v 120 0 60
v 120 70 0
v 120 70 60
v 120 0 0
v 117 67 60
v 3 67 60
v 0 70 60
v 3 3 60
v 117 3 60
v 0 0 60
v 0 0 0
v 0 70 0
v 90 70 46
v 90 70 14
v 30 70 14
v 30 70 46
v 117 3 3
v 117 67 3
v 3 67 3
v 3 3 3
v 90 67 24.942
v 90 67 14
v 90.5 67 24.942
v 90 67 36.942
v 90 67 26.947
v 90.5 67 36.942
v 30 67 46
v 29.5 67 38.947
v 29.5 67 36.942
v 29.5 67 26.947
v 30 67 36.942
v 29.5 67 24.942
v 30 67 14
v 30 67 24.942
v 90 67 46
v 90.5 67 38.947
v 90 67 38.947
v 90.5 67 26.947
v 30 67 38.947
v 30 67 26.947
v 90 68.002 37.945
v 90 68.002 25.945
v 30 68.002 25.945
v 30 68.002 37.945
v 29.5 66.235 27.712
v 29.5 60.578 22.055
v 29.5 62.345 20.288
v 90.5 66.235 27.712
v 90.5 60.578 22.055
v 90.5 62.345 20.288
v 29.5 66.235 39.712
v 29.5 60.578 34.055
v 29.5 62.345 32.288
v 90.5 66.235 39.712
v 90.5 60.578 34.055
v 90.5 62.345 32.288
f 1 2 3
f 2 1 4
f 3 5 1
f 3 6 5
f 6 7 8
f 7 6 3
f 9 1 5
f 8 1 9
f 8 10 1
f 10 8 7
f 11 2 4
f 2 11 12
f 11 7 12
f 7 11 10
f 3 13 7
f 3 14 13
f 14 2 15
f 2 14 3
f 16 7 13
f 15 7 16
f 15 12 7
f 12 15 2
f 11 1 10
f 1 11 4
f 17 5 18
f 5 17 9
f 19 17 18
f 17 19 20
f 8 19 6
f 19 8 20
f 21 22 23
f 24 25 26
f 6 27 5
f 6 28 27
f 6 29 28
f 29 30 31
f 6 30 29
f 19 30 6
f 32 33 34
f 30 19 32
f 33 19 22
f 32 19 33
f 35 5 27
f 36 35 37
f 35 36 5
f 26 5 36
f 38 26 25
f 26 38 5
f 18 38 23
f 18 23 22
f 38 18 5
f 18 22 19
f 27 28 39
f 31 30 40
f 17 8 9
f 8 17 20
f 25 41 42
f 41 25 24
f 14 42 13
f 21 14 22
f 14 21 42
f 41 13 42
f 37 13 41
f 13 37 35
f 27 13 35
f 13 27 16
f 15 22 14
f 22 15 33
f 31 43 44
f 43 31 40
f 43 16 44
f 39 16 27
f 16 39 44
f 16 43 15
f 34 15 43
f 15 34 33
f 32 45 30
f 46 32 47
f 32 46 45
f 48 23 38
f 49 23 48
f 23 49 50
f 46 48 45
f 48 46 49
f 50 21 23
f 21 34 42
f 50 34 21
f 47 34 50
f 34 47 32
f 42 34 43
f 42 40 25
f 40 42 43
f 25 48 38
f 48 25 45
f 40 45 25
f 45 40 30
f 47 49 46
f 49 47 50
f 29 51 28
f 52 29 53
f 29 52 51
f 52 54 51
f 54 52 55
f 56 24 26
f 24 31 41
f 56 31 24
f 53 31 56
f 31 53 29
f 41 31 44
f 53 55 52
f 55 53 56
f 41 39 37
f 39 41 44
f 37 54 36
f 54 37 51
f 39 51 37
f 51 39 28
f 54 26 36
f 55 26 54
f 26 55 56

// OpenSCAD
$fn = 32;

// ----------------------------------------------------------------------
// Vent box: louvers enclosure
// ----------------------------------------------------------------------

// --- parameters (mm) ---
box_l = 120;              // box length, X
box_w = 70;               // box width, Y
box_h = 60;               // box height, Z
wall_t = 3;               // shell wall thickness
win_l = 60;               // vent window width, X
win_h = 32;               // vent window height, Z
slat_t = 2.5;             // louver slat thickness
slat_d = 8;               // louver slat depth
slat_a = 45;              // louver slat angle, degrees
slat_pitch = 12;          // louver pitch
slat_yc = 64.29;          // slat centreline Y

win_z0 = (box_h - win_h) / 2;  // window lower edge Z
n_slats = 2;  // louver count
slat_z0 = win_z0 + (win_h - (n_slats - 1) * slat_pitch) / 2;

difference() {
  union() {
    difference() {
      cube([box_l, box_w, box_h]);
  translate([wall_t, wall_t, wall_t])
    cube([box_l - 2 * wall_t, box_w - 2 * wall_t, box_h]);
  translate([(box_l - win_l) / 2, box_w - wall_t - 1, win_z0])
    cube([win_l, wall_t + 2, win_h]);
    }
    for (i = [0 : n_slats - 1])
      translate([box_l / 2, slat_yc, slat_z0 + i * slat_pitch])
        rotate([slat_a, 0, 0])
          cube([win_l + 1, slat_d, slat_t], center = true);
  }
}
